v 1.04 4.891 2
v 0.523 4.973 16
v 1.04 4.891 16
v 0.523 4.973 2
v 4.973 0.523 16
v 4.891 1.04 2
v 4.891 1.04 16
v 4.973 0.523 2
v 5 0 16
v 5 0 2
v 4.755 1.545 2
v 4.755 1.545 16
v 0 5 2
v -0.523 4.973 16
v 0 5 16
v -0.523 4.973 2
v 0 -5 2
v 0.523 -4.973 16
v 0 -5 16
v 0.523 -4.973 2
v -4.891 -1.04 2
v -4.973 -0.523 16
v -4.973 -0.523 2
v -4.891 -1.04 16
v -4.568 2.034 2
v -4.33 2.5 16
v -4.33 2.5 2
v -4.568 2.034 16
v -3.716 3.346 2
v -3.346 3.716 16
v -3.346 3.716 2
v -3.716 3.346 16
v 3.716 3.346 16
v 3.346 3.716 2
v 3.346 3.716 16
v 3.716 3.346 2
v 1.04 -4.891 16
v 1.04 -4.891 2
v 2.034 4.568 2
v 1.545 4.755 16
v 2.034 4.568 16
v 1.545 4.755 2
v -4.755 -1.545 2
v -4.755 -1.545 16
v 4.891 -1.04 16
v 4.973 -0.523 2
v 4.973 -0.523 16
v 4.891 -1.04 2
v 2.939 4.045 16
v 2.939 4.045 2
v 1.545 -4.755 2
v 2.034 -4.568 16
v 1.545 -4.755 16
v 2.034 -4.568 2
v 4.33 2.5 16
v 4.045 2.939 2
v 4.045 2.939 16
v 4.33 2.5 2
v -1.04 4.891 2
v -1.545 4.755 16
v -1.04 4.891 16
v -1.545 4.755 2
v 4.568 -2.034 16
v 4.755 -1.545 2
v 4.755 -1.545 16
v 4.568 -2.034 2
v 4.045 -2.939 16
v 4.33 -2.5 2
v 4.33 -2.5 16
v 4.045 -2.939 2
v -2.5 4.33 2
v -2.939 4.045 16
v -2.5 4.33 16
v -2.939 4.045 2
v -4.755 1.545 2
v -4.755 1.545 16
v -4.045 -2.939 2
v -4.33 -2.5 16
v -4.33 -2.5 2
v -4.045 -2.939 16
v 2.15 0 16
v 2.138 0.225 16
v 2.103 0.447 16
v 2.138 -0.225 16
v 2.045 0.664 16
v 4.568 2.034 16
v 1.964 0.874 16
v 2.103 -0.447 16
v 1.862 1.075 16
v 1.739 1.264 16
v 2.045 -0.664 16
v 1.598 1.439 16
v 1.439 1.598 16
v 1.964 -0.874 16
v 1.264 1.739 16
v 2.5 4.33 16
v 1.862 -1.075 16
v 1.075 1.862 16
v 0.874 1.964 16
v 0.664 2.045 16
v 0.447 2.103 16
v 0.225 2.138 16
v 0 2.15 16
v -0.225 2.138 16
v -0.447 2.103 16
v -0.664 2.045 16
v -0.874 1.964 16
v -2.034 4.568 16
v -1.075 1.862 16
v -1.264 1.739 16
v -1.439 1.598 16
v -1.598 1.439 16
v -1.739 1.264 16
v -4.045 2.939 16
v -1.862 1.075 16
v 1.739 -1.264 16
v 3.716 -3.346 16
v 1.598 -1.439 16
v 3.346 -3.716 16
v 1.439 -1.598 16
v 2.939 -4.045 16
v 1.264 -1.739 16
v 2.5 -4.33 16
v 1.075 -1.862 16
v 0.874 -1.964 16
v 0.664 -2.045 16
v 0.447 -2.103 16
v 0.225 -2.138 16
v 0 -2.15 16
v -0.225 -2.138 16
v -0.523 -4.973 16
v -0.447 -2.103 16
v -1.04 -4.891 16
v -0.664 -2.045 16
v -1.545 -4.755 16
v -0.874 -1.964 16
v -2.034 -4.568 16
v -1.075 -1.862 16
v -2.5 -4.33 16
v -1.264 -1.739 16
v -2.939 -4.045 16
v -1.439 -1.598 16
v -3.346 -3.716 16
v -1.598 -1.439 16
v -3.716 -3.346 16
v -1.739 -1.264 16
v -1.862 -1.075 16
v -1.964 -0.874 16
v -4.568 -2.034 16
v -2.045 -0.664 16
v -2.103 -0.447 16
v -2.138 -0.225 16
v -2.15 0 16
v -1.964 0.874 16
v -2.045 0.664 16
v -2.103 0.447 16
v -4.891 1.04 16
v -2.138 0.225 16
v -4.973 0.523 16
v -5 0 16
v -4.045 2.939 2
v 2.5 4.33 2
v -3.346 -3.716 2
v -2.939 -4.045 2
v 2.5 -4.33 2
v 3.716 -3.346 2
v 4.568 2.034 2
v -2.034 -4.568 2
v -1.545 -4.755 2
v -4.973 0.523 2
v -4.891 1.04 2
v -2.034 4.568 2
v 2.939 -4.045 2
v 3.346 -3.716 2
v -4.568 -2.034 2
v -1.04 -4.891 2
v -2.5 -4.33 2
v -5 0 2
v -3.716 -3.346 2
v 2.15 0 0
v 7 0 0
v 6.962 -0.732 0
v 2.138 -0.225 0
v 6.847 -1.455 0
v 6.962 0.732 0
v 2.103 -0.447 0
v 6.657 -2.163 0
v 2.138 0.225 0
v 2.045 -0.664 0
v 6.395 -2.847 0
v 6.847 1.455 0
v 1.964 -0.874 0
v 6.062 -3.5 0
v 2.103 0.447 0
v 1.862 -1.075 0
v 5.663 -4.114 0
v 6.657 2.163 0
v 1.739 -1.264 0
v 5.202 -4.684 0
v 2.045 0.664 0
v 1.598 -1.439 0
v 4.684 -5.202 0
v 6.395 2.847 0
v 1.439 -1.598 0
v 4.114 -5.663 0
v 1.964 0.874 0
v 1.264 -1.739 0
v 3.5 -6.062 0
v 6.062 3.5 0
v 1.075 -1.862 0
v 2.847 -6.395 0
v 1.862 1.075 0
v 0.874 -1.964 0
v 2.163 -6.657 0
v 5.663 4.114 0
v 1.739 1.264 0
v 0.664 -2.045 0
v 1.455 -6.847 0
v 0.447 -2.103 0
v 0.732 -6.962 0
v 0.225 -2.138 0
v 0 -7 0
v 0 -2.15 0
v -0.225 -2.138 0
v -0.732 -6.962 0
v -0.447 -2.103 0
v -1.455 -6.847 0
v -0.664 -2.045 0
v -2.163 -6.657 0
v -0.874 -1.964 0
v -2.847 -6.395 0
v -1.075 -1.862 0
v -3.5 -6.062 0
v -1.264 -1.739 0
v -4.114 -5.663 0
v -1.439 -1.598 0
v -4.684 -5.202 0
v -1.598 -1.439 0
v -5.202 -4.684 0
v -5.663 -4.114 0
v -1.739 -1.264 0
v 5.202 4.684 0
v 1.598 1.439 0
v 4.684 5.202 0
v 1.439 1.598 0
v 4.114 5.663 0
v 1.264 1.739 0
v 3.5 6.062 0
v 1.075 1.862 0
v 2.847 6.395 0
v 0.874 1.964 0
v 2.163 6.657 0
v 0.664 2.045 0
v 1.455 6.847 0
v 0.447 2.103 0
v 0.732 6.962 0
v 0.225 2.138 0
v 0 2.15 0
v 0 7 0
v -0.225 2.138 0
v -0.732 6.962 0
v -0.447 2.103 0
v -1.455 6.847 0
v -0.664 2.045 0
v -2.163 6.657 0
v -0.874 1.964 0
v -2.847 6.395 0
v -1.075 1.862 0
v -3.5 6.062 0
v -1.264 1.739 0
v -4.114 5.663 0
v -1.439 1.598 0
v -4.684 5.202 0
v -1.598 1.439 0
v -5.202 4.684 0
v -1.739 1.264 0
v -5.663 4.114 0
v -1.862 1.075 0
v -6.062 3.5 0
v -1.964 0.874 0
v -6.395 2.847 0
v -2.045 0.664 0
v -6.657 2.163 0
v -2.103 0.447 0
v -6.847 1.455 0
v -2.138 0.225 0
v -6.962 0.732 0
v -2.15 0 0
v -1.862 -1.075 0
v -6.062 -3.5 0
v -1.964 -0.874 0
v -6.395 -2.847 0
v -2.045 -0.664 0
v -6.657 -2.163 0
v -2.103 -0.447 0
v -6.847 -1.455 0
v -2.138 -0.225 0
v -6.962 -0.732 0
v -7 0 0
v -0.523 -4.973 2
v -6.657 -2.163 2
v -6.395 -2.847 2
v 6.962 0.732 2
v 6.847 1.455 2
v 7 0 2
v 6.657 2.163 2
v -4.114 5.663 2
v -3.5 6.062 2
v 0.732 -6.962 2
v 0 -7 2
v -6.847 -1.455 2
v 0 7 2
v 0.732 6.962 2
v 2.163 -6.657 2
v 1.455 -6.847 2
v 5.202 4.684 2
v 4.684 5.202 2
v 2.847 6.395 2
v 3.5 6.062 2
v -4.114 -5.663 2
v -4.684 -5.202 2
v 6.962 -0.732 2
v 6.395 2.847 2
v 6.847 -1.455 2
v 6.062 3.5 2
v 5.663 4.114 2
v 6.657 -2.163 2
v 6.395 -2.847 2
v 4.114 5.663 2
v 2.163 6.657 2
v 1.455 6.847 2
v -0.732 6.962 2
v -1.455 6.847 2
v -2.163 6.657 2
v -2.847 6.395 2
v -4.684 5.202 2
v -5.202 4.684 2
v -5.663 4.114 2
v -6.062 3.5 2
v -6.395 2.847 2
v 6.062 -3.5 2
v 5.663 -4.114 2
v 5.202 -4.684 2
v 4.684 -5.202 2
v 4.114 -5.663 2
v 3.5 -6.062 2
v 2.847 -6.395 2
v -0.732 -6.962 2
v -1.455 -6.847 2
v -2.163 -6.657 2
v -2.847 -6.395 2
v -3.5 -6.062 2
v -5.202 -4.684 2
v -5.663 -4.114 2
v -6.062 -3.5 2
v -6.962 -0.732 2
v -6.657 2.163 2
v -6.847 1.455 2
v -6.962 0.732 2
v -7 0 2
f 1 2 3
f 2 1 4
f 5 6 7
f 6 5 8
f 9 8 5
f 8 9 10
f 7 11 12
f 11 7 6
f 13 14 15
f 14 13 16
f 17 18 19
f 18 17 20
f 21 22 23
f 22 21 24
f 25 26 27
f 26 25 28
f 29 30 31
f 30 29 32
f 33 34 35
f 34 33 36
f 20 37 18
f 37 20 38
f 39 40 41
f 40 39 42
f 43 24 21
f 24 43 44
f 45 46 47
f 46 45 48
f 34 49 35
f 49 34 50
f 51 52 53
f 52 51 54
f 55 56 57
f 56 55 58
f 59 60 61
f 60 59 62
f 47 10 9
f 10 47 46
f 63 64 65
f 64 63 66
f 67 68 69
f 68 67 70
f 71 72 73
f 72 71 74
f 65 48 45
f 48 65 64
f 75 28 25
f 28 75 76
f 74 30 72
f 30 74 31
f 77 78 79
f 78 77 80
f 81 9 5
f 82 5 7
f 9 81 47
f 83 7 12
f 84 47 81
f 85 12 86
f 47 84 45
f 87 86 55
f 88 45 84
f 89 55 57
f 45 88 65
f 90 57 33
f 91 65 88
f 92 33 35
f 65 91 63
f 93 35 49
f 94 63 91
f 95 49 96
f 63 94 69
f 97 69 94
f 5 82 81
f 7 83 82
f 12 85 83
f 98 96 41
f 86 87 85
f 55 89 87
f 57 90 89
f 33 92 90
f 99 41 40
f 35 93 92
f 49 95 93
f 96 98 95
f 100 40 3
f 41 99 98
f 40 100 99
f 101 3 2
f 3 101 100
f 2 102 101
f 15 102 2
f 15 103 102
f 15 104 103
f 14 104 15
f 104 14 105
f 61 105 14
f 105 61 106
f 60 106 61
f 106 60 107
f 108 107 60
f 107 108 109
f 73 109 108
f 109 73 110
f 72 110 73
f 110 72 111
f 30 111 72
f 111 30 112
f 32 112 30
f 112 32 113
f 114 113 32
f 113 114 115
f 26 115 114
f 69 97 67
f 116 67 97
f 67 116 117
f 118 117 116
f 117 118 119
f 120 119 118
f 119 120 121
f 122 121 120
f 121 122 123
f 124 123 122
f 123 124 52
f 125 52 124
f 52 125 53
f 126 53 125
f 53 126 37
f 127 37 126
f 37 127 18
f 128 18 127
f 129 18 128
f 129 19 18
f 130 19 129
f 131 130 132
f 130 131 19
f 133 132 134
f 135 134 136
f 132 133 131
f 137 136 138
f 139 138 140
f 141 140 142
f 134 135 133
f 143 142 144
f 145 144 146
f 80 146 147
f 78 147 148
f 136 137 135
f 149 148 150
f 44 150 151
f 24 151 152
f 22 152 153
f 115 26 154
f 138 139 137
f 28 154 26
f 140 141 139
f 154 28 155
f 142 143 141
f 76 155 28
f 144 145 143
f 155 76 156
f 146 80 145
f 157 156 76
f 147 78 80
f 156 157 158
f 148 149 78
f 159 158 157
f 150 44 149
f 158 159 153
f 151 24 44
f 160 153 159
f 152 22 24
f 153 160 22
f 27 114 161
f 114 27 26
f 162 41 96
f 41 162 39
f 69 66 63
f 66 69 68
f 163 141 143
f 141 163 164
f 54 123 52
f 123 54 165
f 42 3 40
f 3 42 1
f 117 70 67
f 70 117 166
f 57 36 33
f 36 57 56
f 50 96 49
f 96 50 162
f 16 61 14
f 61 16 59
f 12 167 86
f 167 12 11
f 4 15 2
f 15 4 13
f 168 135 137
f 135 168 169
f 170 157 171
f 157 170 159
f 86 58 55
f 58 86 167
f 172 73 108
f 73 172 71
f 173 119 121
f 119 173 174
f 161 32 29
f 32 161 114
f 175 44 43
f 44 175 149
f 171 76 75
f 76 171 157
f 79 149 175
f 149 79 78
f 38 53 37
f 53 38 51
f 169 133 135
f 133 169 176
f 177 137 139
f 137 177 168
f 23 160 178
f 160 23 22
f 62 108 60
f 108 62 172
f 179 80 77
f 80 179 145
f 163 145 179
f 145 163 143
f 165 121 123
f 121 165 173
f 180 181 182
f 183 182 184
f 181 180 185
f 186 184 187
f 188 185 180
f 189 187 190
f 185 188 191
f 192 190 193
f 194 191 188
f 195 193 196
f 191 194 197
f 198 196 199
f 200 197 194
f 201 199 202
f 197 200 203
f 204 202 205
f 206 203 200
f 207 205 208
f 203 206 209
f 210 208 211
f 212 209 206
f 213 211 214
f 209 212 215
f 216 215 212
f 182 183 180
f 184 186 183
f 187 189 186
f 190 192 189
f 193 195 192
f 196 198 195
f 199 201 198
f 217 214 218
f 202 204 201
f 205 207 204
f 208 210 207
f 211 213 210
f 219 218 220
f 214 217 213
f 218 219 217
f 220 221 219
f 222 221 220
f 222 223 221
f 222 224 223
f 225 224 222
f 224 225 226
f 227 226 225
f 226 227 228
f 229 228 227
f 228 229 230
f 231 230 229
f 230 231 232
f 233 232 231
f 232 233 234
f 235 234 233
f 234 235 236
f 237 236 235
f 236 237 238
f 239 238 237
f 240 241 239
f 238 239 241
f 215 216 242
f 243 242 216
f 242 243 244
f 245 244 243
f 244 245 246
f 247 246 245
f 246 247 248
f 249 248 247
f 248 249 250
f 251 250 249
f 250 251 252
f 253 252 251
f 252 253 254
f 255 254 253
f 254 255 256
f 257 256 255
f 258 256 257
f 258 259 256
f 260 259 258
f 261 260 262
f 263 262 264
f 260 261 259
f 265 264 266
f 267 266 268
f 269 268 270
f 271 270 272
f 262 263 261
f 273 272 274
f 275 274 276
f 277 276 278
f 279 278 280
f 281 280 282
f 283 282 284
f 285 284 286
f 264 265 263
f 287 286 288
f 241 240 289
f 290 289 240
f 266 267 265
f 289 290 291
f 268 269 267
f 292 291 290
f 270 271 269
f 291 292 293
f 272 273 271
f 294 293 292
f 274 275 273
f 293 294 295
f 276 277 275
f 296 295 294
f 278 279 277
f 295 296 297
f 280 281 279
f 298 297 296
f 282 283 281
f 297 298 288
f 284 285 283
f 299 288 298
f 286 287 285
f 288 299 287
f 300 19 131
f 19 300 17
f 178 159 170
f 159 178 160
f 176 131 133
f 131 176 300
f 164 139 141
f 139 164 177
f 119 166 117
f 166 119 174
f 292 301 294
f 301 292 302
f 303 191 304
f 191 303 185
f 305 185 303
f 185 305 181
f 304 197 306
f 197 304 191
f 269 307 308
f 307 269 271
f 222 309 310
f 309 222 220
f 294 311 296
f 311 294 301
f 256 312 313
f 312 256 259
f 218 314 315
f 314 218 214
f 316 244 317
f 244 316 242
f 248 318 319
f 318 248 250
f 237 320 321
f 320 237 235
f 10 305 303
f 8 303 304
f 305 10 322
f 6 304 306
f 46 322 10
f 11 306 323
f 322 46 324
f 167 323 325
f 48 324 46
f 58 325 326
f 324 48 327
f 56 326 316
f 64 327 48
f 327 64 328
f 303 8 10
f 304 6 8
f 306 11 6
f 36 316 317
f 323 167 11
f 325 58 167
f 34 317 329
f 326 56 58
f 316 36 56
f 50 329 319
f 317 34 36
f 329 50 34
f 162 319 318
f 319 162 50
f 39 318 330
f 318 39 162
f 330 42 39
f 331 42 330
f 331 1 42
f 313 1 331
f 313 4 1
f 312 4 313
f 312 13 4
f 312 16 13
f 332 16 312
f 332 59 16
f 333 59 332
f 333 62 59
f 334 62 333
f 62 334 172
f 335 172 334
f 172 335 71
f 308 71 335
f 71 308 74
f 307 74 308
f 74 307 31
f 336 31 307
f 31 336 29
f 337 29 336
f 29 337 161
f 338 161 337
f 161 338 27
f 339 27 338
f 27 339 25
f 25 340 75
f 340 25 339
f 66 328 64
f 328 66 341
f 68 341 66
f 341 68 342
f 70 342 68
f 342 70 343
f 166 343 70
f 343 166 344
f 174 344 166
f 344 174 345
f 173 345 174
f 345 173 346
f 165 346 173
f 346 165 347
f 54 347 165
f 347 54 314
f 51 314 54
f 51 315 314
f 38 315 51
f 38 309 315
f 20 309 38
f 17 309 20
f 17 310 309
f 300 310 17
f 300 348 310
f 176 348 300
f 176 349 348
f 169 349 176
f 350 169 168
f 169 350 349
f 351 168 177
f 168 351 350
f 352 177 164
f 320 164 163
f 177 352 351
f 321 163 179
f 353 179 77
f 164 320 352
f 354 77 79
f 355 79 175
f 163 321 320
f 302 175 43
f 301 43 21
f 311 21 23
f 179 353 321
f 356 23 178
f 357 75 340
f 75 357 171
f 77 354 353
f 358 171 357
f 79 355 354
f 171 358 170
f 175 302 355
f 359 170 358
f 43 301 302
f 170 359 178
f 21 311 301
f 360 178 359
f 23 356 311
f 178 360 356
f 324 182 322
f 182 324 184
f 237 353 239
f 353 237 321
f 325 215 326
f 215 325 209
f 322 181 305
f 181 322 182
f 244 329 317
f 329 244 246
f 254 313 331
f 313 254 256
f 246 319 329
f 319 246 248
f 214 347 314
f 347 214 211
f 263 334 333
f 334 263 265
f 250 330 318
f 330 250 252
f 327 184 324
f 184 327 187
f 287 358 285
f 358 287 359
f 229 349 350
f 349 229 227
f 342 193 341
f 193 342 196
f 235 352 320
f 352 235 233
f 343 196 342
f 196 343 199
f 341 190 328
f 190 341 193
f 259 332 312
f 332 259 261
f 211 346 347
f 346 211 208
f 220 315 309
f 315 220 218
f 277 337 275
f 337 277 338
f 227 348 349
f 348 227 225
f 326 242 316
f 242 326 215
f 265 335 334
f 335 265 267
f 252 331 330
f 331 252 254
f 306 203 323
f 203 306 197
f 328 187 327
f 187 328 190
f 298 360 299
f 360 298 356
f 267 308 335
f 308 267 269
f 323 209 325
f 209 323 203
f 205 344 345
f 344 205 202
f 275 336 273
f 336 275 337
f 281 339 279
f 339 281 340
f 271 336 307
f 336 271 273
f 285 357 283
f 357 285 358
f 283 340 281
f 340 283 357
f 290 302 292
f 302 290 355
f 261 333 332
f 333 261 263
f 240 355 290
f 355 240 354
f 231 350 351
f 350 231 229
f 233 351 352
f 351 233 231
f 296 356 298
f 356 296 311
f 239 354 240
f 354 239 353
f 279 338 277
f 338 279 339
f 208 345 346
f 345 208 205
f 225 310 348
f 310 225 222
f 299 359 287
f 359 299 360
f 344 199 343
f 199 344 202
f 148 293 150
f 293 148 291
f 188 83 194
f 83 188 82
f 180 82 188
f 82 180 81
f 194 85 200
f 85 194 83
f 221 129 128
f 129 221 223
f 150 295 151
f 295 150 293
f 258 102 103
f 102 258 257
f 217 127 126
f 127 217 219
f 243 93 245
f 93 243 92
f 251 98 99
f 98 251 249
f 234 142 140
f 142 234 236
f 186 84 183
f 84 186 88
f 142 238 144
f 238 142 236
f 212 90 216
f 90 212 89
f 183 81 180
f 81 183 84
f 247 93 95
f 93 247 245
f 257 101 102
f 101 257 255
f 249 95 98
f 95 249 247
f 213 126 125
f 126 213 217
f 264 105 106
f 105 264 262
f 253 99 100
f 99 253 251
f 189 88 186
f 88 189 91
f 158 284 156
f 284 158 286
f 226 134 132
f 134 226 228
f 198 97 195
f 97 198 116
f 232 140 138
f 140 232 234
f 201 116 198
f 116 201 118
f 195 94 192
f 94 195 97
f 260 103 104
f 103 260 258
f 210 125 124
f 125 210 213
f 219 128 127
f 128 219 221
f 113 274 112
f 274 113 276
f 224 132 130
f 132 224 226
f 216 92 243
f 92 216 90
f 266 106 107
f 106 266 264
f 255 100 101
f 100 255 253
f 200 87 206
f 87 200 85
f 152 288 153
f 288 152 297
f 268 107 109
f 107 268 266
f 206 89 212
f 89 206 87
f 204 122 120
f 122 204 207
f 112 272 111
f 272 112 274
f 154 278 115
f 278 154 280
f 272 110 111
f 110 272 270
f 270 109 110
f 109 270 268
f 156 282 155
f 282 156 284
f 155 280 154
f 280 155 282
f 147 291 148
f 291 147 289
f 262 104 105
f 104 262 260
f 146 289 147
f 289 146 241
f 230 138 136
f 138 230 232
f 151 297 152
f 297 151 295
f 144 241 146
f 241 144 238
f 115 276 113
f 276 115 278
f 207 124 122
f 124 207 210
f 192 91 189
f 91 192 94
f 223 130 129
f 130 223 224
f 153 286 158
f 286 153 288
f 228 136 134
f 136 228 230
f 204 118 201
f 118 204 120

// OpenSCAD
// Motor mounting standoff.
$fn = 60;
eps = 0.02;
thread_d = 4.3;
outer_d = 10;
length = 16;
difference() {
    union() { cylinder(d=outer_d,h=length); cylinder(d=outer_d+4,h=2); }
    translate([0,0,-eps]) cylinder(d=thread_d,h=length+2*eps);
}
